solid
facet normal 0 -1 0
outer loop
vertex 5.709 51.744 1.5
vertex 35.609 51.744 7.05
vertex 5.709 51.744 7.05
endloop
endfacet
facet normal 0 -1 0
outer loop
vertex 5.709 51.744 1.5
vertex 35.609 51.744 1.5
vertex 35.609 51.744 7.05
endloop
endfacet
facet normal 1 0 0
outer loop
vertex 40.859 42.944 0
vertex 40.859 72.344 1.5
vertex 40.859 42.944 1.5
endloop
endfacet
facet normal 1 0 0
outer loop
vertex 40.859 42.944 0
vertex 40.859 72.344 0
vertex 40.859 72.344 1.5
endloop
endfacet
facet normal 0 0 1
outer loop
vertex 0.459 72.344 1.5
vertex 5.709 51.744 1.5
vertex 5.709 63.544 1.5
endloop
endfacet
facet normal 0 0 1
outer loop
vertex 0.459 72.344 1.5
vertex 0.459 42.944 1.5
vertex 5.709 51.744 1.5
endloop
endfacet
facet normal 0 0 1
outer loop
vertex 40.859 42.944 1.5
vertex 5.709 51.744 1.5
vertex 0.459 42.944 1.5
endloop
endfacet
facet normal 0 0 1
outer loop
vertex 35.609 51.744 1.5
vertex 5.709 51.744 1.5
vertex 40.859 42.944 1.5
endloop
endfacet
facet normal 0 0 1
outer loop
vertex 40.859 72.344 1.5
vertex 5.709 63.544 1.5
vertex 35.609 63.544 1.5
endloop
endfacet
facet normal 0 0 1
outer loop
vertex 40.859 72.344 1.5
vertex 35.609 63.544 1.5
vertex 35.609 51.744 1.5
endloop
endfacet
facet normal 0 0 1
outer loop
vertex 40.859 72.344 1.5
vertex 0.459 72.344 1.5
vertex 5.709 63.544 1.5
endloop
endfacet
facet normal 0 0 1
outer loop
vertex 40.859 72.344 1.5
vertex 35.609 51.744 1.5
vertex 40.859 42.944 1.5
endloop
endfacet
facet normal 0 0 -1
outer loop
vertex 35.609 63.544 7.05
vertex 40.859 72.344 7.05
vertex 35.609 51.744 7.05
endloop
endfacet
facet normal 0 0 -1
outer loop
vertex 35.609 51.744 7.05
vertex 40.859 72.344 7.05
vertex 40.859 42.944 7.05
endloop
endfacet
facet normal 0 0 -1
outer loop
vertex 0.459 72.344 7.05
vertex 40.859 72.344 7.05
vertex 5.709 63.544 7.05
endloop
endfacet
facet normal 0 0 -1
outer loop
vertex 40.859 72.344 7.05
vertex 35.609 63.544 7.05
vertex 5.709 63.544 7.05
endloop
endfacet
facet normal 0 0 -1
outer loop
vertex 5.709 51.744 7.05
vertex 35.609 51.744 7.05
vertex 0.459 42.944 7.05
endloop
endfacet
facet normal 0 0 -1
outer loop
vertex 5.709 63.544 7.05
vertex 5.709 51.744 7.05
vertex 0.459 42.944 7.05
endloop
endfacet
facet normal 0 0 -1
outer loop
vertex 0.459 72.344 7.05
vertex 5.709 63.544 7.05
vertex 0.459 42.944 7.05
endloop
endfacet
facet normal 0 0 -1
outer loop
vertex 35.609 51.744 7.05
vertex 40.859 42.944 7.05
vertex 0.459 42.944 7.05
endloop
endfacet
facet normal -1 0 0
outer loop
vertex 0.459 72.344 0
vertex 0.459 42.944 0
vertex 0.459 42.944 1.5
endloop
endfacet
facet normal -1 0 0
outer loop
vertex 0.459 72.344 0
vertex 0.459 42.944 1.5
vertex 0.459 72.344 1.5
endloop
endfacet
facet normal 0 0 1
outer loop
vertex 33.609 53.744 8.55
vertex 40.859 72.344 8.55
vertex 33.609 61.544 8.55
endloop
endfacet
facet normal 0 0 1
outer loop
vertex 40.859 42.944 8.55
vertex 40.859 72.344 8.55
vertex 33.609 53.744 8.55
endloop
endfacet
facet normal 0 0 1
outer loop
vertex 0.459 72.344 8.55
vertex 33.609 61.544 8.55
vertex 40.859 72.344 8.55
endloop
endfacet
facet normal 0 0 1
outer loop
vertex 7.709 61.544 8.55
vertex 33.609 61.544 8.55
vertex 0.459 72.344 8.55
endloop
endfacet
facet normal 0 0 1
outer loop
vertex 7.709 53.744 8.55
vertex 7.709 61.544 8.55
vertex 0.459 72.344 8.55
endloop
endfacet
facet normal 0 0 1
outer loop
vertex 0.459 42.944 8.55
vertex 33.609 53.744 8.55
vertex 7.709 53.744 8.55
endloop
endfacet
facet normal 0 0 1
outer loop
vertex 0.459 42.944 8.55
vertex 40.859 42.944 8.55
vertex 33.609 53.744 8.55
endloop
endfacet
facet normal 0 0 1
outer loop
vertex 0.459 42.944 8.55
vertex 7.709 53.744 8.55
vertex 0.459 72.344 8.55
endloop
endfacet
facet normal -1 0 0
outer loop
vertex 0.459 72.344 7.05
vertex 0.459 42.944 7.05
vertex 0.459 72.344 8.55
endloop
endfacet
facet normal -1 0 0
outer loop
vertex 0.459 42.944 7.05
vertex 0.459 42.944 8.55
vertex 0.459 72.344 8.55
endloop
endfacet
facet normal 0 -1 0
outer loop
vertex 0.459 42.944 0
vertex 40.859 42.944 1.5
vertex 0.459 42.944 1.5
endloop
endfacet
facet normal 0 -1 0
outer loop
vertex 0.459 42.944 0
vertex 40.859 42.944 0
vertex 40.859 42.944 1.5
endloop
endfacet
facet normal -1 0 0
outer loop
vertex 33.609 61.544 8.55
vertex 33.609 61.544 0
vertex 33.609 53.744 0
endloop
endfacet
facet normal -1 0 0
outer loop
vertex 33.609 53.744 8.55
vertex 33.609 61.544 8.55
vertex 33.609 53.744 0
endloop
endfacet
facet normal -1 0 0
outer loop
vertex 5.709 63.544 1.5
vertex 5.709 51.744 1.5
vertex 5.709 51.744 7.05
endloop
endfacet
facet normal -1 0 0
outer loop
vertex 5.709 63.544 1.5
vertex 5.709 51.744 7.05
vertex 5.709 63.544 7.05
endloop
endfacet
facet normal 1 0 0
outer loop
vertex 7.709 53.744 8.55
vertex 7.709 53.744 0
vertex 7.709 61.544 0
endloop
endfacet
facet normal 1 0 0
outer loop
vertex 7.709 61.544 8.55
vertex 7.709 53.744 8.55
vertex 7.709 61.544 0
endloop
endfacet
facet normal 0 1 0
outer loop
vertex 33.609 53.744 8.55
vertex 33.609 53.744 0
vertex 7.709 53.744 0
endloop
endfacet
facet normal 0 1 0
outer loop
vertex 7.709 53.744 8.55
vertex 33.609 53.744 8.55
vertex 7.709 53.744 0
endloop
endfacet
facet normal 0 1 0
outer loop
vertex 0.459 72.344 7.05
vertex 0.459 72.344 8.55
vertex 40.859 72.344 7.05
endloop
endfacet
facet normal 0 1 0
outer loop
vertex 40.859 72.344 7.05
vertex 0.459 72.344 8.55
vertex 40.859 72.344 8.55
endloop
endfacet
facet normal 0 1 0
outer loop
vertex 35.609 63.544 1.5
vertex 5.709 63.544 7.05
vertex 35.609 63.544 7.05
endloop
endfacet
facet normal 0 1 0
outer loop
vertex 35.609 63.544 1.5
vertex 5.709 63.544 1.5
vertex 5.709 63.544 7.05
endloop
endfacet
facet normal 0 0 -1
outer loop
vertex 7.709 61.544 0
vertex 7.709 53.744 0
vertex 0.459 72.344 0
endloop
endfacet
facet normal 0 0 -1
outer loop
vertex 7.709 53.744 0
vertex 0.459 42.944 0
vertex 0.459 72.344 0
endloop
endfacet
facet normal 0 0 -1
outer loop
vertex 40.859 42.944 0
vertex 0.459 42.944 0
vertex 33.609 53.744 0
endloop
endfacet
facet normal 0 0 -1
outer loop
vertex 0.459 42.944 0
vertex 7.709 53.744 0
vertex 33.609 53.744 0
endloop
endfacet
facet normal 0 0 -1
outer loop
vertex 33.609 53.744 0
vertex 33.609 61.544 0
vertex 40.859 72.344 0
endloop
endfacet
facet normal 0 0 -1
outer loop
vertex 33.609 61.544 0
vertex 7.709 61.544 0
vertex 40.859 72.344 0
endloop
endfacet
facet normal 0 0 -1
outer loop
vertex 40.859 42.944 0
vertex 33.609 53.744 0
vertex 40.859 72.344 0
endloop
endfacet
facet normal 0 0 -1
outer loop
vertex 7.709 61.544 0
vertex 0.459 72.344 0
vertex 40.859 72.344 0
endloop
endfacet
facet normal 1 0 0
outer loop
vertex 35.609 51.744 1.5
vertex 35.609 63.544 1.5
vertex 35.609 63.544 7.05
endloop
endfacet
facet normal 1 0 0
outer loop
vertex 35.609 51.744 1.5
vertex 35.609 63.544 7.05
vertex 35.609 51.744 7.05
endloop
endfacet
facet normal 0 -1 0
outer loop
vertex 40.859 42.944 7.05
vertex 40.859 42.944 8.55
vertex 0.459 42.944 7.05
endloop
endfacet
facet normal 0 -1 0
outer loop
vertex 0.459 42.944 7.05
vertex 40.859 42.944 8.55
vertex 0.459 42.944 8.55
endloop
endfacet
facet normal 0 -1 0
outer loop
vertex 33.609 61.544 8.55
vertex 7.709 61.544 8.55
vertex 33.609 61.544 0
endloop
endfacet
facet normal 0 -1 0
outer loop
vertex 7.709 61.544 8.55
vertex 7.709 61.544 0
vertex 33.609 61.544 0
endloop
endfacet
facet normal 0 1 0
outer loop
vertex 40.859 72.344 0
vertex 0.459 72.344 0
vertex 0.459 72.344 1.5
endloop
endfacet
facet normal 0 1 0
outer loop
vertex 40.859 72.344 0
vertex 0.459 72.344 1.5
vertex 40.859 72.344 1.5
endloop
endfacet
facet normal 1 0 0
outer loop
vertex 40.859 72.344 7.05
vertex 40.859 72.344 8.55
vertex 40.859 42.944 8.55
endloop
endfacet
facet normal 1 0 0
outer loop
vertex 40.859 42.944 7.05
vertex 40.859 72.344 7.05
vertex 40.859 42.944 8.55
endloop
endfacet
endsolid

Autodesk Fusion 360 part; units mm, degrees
sketch "Sketch1" plane through (0, 0, 0) normal (0, 0, 1) x (1, 0, 0)
  line L0 (0.4589, 72.3441) -> (40.8589, 72.3441)
  line L1 (40.8589, 72.3441) -> (40.8589, 42.9441)
  line L2 (40.8589, 42.9441) -> (0.4589, 42.9441)
  line L3 (0.4589, 42.9441) -> (0.4589, 72.3441)
  line L4 (7.7089, 61.5441) -> (33.6089, 61.5441)
  line L5 (33.6089, 61.5441) -> (33.6089, 53.7441)
  line L6 (33.6089, 53.7441) -> (7.7089, 53.7441)
  line L7 (7.7089, 53.7441) -> (7.7089, 61.5441)
  line L8 (20.6589, 72.3441) -> (20.6589, 42.9441) construction
  line L9 (7.7089, 57.6441) -> (33.6089, 57.6441) construction
  line L10 (35.6089, 51.7441) -> (5.7089, 51.7441)
  line L11 (5.7089, 51.7441) -> (5.7089, 63.5441)
  line L12 (5.7089, 63.5441) -> (35.6089, 63.5441)
  line L13 (35.6089, 63.5441) -> (35.6089, 51.7441)
  dimension "d7" = 10.8
  dimension "d8" = 10.8
  dimension "d9" = 7.8
  dimension "d10" = 25.9
  dimension "d11" = 40.4
  dimension "d12" = -2
extrude "Extrude1" add sketch "Sketch1" along normal blind 8.55 contours L10 L11 L12 L13
extrude "Extrude2" add sketch "Sketch1" along normal blind 1.5 contours L0 L1 L2 L3
sketch "Sketch2" plane through (0, 0, 8.55) normal (0, 0, 1) x (-1, 0, 0)
  line L0 (-33.6089, -53.7441) -> (-7.7089, -53.7441)
  line L1 (-7.7089, -53.7441) -> (-7.7089, -61.5441)
  line L2 (-7.7089, -61.5441) -> (-33.6089, -61.5441)
  line L3 (-33.6089, -61.5441) -> (-33.6089, -53.7441)
  line L4 (-35.6089, -63.5441) -> (-5.7089, -63.5441)
  line L5 (-5.7089, -63.5441) -> (-5.7089, -51.7441)
  line L6 (-5.7089, -51.7441) -> (-35.6089, -51.7441)
  line L7 (-35.6089, -51.7441) -> (-35.6089, -63.5441)
  line L8 (-40.8589, -72.3441) -> (-40.8589, -42.9441)
  line L9 (-0.4589, -72.3441) -> (-40.8589, -72.3441)
  line L10 (-40.8589, -42.9441) -> (-0.4589, -42.9441)
  line L11 (-0.4589, -42.9441) -> (-0.4589, -72.3441)
extrude "Extrude3" add sketch "Sketch2" against normal blind 1.5 contours L8 L9 L10 L11
equation "CenterLegWidth = 7.3 mm"
equation "CenterLegThickness = 25.4 mm"
equation "SideLegWidth = 3.65 mm"
equation "SideLegThickness = 25.4 mm"
equation "WindowWidth = 11.6 mm"
equation "WindowHeight = 9 mm"
equation "d7 = WindowWidth - 0.8 mm"
equation "d8 = WindowWidth - 0.8 mm"
equation "d9 = CenterLegWidth + 0.5 mm"
equation "d10 = CenterLegThickness + 0.5 mm"
equation "d11 = CenterLegThickness + 15 mm"
equation "d13 = WindowHeight - 0.45 mm"
